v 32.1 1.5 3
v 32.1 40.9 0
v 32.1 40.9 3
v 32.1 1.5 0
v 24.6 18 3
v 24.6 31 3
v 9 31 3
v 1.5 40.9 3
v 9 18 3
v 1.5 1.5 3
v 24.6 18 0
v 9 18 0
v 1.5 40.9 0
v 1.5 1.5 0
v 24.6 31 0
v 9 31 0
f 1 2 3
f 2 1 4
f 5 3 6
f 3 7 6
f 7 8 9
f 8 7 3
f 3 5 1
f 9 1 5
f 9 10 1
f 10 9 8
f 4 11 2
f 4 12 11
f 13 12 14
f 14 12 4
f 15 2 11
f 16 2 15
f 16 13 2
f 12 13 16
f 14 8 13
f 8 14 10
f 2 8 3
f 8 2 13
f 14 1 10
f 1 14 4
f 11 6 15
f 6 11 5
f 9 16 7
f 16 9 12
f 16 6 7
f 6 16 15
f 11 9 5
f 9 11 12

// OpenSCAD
union() {
	difference() {
		translate(v = [1.5000000000, 1.5000000000, 0]) {
			cube(size = [30.6000000000, 39.4000000000, 3]);
		}
		translate(v = [9, 18]) {
			cube(size = [15.6000000000, 13, 3]);
		}
	}
}
